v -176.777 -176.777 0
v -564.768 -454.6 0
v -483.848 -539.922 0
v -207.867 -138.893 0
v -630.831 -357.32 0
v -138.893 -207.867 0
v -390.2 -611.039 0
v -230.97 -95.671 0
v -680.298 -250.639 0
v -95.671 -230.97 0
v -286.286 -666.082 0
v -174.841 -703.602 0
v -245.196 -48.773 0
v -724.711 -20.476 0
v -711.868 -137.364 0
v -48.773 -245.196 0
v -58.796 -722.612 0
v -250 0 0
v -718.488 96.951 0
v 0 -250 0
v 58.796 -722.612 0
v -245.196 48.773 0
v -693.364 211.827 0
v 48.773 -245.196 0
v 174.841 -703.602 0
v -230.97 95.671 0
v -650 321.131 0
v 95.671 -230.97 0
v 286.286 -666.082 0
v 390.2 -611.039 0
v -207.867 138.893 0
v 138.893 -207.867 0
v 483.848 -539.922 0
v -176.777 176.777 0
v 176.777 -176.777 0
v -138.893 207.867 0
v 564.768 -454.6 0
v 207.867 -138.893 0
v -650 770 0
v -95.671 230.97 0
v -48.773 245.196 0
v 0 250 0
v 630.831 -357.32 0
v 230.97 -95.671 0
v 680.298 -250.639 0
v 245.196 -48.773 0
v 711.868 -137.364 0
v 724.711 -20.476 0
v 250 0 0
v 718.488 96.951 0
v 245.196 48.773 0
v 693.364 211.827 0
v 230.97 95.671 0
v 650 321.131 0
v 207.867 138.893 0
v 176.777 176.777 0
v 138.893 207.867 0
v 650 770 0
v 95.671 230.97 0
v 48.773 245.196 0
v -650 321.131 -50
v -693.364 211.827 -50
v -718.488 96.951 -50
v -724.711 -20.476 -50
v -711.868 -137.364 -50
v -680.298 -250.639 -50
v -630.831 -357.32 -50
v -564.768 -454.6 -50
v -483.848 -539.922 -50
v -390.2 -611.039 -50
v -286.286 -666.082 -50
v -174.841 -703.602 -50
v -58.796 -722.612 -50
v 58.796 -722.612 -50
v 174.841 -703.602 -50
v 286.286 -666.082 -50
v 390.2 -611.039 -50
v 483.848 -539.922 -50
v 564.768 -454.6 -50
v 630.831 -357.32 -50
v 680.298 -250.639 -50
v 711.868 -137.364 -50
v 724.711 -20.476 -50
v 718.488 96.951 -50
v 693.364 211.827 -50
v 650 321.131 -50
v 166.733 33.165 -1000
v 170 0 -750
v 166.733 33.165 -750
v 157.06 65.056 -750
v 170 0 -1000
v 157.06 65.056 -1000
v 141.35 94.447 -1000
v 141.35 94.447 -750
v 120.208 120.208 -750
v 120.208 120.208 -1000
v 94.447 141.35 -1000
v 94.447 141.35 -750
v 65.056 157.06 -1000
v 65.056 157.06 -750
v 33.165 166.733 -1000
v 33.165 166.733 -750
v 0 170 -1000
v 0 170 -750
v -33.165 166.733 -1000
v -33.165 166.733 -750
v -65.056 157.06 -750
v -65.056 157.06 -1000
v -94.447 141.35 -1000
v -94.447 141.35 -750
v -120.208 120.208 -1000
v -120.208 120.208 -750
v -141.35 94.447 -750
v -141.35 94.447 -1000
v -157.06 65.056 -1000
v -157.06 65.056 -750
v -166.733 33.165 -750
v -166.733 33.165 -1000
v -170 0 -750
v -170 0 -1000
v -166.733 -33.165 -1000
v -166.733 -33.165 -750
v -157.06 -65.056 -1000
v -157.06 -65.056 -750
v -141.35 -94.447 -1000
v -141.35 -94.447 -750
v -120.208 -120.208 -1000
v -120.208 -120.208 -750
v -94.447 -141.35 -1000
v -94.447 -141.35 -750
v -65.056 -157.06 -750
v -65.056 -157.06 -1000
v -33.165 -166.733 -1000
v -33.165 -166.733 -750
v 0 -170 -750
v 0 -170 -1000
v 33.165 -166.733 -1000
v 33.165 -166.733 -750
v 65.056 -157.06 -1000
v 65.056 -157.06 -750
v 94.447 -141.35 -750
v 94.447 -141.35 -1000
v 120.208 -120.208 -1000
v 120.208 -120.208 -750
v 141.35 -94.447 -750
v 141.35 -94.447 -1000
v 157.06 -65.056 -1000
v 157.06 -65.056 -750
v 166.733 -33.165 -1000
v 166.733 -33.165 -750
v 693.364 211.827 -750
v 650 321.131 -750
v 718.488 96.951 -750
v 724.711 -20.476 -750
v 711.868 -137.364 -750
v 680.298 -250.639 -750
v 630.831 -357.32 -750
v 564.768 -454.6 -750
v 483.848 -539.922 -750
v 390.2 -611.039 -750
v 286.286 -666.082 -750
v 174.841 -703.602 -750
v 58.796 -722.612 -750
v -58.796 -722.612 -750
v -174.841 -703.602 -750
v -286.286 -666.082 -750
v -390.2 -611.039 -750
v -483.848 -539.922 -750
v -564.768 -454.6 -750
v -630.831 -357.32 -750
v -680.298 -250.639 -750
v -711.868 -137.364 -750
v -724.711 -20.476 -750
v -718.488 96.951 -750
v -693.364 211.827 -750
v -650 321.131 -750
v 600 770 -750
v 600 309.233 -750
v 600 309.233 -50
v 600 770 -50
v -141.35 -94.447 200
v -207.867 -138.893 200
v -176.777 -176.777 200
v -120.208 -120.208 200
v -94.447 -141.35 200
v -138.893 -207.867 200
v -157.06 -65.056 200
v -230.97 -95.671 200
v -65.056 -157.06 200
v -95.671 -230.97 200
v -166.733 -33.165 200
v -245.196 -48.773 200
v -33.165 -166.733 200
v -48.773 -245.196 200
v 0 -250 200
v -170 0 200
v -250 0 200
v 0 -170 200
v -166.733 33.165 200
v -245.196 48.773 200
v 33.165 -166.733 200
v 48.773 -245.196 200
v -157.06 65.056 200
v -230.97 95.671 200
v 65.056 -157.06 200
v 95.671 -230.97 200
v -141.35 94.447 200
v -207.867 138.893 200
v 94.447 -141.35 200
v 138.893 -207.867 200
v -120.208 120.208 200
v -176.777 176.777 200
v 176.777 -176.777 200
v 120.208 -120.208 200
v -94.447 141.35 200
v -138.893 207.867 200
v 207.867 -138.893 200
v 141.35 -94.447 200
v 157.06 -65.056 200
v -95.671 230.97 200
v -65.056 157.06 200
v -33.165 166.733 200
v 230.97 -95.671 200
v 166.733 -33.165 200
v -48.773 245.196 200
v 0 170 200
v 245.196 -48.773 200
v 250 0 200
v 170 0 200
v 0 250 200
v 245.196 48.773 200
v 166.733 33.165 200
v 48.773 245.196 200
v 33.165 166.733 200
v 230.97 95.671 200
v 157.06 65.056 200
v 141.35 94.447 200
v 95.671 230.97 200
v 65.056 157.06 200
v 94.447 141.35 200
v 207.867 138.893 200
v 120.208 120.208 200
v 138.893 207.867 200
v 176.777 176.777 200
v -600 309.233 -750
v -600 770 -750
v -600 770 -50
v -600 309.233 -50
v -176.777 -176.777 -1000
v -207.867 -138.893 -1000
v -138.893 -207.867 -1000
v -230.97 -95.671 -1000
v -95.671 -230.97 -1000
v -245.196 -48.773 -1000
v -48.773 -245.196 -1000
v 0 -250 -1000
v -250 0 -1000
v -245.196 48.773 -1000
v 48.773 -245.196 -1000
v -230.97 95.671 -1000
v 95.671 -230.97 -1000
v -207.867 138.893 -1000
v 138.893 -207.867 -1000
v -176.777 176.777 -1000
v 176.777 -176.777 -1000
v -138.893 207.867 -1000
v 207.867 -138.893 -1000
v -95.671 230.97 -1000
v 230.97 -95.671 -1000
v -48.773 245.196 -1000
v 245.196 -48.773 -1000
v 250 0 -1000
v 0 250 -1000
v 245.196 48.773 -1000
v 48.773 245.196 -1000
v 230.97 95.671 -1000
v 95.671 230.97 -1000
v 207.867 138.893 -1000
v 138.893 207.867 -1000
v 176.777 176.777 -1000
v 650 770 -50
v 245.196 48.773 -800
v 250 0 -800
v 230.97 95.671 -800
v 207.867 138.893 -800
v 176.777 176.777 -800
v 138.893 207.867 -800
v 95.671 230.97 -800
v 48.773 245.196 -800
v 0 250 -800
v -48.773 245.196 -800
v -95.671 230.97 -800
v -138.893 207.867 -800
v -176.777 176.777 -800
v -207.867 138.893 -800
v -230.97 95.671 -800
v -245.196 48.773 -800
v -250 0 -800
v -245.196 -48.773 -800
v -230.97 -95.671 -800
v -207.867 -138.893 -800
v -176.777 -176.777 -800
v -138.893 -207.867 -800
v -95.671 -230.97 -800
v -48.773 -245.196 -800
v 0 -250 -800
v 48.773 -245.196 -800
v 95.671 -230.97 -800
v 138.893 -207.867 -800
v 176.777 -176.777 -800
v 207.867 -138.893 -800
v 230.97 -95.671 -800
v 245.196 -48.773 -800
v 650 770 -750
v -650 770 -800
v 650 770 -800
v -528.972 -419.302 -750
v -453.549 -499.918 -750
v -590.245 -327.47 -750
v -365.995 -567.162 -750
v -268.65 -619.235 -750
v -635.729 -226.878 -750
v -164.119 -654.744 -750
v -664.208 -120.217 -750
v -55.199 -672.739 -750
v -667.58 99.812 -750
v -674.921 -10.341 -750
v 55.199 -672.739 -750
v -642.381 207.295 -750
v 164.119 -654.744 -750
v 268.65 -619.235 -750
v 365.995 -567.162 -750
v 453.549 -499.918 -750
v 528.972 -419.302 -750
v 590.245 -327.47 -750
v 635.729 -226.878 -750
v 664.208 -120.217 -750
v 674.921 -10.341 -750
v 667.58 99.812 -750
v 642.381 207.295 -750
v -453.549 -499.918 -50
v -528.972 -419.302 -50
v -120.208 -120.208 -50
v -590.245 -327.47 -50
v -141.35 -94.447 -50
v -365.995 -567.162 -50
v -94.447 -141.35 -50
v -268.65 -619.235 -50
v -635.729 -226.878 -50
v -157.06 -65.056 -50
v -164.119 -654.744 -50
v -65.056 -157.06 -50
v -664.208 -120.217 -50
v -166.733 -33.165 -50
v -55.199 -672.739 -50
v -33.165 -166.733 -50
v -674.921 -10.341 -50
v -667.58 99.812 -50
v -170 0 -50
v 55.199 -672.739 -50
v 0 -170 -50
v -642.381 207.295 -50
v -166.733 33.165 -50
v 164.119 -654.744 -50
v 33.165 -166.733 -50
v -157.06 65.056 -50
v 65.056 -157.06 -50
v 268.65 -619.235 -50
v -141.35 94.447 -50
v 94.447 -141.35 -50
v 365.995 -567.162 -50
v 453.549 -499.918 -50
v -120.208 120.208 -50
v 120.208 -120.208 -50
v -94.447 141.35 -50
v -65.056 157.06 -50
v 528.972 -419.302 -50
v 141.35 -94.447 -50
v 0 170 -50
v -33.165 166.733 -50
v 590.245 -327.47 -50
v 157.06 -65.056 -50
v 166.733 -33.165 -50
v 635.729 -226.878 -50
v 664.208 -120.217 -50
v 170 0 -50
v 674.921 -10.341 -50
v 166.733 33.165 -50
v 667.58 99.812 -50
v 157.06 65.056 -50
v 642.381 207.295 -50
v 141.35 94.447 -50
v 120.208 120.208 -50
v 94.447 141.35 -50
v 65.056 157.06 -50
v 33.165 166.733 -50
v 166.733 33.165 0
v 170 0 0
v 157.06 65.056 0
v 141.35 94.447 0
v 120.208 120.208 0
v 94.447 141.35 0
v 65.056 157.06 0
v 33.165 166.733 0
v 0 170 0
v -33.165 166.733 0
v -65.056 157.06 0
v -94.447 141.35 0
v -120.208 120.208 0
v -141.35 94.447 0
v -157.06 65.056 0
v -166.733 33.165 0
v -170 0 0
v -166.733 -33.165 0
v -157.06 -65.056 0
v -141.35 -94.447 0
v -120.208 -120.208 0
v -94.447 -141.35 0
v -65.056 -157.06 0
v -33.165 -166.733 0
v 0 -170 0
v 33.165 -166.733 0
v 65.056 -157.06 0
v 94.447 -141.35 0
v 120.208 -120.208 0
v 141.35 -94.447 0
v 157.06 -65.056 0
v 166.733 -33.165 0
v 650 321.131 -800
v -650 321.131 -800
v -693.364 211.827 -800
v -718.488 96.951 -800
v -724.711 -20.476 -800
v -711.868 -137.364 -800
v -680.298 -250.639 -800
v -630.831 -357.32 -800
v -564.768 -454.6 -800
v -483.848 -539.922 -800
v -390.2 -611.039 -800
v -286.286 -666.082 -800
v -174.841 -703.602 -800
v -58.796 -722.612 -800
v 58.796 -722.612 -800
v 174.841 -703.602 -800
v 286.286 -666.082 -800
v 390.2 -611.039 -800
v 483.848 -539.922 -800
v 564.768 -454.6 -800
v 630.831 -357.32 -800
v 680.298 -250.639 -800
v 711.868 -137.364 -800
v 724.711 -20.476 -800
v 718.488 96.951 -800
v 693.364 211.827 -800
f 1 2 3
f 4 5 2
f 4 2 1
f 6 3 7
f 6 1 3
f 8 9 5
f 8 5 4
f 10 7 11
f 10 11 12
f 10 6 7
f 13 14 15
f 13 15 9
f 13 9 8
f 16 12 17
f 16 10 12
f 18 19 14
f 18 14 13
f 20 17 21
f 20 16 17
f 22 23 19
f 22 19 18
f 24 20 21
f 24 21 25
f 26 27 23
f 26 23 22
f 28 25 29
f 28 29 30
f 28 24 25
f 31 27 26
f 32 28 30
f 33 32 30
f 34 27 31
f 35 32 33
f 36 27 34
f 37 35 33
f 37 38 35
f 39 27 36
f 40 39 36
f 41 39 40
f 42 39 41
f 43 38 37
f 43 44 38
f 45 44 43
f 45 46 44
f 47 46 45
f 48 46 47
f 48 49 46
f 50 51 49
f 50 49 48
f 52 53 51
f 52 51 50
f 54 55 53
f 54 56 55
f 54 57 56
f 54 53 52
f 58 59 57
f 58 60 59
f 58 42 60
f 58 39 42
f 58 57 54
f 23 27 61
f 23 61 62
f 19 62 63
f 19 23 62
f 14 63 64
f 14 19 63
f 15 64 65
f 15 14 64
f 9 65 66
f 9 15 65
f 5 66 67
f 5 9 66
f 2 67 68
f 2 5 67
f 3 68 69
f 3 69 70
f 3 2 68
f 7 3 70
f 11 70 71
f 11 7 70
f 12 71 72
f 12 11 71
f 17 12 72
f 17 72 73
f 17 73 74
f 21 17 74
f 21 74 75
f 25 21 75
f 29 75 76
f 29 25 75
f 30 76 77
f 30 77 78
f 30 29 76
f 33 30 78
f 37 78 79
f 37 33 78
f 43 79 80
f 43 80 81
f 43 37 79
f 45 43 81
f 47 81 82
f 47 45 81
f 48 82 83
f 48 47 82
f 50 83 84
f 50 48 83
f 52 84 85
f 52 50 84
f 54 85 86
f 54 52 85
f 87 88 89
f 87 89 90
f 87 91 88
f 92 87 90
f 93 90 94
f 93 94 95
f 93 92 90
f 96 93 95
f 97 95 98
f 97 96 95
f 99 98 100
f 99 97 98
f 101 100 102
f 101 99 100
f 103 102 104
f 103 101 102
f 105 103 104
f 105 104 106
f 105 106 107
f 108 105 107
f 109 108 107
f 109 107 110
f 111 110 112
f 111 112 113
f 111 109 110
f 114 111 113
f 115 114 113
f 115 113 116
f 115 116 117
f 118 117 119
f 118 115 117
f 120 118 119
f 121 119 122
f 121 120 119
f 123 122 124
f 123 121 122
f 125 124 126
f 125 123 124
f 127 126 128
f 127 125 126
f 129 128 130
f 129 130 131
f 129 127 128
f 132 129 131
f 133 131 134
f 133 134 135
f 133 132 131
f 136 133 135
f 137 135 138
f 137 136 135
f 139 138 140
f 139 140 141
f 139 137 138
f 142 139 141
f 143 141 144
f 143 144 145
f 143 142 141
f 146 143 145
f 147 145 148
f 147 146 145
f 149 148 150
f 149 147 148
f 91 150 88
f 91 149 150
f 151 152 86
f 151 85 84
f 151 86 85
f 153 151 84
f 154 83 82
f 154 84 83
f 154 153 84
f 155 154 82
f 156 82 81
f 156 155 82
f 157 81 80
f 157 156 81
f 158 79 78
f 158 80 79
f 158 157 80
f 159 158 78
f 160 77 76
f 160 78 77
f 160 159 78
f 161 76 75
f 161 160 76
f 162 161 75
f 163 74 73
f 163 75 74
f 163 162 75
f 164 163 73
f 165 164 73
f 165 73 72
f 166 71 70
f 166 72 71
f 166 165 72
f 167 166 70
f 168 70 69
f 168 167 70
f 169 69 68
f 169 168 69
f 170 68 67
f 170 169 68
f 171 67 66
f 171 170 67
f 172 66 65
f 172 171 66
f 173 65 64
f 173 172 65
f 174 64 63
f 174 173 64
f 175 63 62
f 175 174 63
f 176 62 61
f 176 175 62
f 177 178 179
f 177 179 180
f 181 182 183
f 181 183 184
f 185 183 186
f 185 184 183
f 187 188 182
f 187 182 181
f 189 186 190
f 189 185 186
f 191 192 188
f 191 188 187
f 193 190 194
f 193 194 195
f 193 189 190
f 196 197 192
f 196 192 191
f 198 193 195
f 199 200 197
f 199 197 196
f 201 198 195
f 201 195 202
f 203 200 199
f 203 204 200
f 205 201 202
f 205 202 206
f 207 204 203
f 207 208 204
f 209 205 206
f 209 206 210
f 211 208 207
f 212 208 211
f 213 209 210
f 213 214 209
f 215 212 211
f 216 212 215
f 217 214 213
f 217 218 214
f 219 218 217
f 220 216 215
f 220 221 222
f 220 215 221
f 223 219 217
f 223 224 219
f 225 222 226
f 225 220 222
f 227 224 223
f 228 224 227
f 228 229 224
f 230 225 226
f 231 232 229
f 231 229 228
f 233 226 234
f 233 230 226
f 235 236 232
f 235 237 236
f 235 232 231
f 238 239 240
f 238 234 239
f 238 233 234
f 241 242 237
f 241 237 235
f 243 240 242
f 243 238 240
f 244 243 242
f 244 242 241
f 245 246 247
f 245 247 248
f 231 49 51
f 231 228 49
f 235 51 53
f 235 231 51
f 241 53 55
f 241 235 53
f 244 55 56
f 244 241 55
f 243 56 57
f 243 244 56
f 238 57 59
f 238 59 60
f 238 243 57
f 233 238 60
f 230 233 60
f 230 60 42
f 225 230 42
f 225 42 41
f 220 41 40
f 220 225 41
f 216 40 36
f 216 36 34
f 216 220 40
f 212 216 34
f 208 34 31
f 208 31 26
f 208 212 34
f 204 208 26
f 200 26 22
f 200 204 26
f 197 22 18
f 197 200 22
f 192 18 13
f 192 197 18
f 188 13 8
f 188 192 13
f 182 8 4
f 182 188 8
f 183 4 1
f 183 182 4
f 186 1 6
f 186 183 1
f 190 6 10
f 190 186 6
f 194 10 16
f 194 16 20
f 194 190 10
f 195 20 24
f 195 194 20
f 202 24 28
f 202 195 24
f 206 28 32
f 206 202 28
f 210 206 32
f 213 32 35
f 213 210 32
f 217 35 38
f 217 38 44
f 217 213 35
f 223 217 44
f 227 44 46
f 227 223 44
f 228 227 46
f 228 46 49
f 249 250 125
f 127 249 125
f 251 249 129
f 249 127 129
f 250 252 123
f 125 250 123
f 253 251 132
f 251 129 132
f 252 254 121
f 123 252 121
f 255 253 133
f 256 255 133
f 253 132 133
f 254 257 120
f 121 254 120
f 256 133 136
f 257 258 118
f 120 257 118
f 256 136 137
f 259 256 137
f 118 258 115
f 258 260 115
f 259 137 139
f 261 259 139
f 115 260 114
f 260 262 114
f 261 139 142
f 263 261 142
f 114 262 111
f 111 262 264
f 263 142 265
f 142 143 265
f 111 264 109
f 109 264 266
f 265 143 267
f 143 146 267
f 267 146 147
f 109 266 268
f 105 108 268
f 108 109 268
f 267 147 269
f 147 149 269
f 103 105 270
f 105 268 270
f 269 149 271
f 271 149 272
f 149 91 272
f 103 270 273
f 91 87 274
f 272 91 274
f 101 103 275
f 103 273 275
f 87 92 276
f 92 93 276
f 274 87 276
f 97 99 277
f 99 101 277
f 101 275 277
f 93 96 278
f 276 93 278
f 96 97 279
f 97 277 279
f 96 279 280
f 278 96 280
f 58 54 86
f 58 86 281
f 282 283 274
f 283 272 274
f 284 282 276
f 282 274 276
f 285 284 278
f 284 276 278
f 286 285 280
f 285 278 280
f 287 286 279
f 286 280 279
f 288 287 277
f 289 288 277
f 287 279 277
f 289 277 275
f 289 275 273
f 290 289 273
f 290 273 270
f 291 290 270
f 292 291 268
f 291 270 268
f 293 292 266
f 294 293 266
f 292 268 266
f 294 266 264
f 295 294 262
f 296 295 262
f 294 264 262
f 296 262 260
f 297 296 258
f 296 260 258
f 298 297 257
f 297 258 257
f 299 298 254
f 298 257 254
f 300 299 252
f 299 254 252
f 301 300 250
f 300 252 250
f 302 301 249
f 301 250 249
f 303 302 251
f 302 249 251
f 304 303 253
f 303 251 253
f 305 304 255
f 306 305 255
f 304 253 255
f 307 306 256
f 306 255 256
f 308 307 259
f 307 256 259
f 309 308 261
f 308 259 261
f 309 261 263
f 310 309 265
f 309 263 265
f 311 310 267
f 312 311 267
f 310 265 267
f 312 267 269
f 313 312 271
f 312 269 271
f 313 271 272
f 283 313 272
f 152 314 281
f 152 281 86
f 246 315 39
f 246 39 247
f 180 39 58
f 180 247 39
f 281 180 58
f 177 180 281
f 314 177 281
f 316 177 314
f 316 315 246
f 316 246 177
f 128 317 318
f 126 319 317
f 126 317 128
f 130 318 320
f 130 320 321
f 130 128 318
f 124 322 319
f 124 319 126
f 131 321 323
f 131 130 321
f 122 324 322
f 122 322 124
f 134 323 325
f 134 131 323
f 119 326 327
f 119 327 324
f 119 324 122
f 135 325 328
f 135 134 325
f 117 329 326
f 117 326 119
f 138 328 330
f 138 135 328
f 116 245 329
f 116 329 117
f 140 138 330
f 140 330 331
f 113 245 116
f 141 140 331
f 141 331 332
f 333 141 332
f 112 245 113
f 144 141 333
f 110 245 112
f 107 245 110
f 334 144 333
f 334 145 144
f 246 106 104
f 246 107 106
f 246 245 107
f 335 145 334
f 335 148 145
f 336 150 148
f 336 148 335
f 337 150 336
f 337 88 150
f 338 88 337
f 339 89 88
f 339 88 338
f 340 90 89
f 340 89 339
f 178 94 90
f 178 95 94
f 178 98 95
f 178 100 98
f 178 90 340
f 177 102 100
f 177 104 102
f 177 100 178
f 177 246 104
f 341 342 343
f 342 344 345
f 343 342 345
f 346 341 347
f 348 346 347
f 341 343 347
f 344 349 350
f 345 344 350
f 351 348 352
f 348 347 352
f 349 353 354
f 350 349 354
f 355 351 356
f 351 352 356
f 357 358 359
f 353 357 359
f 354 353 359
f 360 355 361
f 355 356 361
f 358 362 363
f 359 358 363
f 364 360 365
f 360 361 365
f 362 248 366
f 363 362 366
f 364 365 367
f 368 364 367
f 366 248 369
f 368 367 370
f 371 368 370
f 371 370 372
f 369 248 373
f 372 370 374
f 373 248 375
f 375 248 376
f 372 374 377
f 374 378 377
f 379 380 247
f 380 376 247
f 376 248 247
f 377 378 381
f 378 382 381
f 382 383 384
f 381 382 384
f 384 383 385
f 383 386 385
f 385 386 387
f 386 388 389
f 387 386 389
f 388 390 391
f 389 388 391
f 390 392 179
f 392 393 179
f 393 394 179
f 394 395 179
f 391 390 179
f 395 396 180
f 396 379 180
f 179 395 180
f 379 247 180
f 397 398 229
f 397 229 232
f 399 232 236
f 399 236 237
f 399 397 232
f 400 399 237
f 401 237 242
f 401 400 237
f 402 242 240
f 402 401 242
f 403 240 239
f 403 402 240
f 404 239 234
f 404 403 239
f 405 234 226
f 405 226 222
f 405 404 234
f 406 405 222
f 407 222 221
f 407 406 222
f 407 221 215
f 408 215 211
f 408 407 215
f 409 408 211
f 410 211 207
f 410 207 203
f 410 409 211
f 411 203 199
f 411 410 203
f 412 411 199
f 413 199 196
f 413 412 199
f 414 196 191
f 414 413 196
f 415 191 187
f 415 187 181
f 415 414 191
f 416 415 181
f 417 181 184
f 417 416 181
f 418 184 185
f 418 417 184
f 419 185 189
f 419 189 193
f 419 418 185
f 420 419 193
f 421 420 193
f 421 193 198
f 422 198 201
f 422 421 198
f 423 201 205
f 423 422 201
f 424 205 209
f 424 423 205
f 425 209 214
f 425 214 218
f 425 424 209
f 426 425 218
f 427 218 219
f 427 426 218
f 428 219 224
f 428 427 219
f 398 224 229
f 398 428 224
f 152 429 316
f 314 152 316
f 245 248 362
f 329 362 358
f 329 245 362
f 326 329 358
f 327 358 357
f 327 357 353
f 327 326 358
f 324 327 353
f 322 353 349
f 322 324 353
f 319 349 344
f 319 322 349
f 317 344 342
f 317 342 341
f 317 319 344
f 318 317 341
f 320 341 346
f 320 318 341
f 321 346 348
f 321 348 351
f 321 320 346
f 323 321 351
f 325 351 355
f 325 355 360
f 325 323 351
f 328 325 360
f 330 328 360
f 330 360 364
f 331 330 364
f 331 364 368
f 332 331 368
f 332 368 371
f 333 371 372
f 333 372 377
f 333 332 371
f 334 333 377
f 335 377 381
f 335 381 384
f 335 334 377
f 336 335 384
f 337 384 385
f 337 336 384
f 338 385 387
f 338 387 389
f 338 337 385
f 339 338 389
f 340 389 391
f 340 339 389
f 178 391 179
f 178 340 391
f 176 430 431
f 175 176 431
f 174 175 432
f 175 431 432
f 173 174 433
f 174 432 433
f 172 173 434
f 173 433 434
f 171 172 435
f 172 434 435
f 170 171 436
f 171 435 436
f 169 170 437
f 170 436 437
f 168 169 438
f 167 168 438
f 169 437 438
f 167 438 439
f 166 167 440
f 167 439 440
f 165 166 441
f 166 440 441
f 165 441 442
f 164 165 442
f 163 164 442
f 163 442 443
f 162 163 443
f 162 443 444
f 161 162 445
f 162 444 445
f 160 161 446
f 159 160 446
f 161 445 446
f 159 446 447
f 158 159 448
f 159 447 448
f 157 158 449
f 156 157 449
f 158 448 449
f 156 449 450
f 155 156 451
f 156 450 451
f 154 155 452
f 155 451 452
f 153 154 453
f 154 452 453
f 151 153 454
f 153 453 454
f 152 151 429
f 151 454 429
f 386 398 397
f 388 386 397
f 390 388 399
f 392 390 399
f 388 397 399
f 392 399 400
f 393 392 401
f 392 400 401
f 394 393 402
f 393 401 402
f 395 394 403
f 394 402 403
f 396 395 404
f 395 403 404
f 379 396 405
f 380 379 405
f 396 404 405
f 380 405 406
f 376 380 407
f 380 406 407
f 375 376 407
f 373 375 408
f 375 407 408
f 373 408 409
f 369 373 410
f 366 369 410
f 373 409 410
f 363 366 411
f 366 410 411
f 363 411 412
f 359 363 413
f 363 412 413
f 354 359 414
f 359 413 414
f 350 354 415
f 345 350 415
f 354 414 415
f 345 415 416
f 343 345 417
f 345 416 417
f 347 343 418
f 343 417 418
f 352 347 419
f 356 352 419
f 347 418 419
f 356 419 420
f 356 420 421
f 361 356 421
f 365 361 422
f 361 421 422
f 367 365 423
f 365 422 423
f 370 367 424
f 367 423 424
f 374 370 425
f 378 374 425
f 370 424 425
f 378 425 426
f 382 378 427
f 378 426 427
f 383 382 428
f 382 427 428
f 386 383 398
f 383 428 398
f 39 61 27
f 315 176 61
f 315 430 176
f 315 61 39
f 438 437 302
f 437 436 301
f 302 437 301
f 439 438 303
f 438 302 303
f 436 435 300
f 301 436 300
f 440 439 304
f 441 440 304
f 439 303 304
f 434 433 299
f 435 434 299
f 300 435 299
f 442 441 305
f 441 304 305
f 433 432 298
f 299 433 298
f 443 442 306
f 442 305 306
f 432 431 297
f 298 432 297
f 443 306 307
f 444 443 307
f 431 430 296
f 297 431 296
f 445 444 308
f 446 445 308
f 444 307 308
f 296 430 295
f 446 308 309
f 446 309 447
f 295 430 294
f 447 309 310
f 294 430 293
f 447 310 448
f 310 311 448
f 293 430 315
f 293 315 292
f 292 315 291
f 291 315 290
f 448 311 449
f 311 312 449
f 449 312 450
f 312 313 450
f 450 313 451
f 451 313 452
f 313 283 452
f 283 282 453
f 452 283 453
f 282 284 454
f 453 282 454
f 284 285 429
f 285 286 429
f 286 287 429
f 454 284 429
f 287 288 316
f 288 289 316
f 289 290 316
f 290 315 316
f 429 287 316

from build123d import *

# Parameters (mm, degrees)
SKETCH1_R                = 250
SKETCH1_R_2              = 170
BOSS_EXTRUDE1_DEPTH      = 200
BOSS_EXTRUDE1_DEPTH_BACK = 50
SKETCH2_R                = 250
BOSS_EXTRUDE3_DEPTH      = 50
BOSS_EXTRUDE4_START      = -350
BOSS_EXTRUDE4_DEPTH      = 700


with BuildPart() as part:
    # Sketch1 → Boss-Extrude1 (new body, two sides)
    with BuildSketch(Plane.XY) as boss_extrude1_sk:
        Circle(SKETCH1_R)
        Circle(SKETCH1_R_2, mode=Mode.SUBTRACT)
    extrude(amount=BOSS_EXTRUDE1_DEPTH)
    extrude(boss_extrude1_sk.sketch, amount=-BOSS_EXTRUDE1_DEPTH_BACK)

    # Sketch2 → Boss-Extrude3 (add)
    with BuildSketch(Plane.XY):
        with BuildLine():
            Line((-650, 770), (-650, 321.130814467))
            ThreePointArc((-650, 321.130814467), (0, -725), (650, 321.130814467))
            Line((650, 321.130814467), (650, 770))
            Line((650, 770), (-650, 770))
        make_face()
        Circle(SKETCH2_R, mode=Mode.SUBTRACT)
    extrude(amount=-BOSS_EXTRUDE3_DEPTH)


with BuildPart() as body_2:
    # Mirror9: mirrored copy
    add(part.part.mirror(Plane.XY.offset(-400)))


with BuildPart() as part_1:
    add(part.part)

    add(body_2.part)  # Boss-Extrude4 merges body 2
    # Sketch4 → Boss-Extrude4 (add)
    with BuildSketch(Plane.XY.offset(-400).offset(BOSS_EXTRUDE4_START)):
        with BuildLine():
            Line((-600, 770), (-600, 309.232921921))
            ThreePointArc((-600, 309.232921921), (0, -675), (600, 309.232921921))
            Line((600, 309.232921921), (600, 770))
            Line((600, 770), (650, 770))
            Line((650, 770), (650, 321.130814467))
            ThreePointArc((650, 321.130814467), (0, -725), (-650, 321.130814467))
            Line((-650, 321.130814467), (-650, 770))
            Line((-650, 770), (-600, 770))
        make_face()
    extrude(amount=BOSS_EXTRUDE4_DEPTH)


solid = part_1.part
